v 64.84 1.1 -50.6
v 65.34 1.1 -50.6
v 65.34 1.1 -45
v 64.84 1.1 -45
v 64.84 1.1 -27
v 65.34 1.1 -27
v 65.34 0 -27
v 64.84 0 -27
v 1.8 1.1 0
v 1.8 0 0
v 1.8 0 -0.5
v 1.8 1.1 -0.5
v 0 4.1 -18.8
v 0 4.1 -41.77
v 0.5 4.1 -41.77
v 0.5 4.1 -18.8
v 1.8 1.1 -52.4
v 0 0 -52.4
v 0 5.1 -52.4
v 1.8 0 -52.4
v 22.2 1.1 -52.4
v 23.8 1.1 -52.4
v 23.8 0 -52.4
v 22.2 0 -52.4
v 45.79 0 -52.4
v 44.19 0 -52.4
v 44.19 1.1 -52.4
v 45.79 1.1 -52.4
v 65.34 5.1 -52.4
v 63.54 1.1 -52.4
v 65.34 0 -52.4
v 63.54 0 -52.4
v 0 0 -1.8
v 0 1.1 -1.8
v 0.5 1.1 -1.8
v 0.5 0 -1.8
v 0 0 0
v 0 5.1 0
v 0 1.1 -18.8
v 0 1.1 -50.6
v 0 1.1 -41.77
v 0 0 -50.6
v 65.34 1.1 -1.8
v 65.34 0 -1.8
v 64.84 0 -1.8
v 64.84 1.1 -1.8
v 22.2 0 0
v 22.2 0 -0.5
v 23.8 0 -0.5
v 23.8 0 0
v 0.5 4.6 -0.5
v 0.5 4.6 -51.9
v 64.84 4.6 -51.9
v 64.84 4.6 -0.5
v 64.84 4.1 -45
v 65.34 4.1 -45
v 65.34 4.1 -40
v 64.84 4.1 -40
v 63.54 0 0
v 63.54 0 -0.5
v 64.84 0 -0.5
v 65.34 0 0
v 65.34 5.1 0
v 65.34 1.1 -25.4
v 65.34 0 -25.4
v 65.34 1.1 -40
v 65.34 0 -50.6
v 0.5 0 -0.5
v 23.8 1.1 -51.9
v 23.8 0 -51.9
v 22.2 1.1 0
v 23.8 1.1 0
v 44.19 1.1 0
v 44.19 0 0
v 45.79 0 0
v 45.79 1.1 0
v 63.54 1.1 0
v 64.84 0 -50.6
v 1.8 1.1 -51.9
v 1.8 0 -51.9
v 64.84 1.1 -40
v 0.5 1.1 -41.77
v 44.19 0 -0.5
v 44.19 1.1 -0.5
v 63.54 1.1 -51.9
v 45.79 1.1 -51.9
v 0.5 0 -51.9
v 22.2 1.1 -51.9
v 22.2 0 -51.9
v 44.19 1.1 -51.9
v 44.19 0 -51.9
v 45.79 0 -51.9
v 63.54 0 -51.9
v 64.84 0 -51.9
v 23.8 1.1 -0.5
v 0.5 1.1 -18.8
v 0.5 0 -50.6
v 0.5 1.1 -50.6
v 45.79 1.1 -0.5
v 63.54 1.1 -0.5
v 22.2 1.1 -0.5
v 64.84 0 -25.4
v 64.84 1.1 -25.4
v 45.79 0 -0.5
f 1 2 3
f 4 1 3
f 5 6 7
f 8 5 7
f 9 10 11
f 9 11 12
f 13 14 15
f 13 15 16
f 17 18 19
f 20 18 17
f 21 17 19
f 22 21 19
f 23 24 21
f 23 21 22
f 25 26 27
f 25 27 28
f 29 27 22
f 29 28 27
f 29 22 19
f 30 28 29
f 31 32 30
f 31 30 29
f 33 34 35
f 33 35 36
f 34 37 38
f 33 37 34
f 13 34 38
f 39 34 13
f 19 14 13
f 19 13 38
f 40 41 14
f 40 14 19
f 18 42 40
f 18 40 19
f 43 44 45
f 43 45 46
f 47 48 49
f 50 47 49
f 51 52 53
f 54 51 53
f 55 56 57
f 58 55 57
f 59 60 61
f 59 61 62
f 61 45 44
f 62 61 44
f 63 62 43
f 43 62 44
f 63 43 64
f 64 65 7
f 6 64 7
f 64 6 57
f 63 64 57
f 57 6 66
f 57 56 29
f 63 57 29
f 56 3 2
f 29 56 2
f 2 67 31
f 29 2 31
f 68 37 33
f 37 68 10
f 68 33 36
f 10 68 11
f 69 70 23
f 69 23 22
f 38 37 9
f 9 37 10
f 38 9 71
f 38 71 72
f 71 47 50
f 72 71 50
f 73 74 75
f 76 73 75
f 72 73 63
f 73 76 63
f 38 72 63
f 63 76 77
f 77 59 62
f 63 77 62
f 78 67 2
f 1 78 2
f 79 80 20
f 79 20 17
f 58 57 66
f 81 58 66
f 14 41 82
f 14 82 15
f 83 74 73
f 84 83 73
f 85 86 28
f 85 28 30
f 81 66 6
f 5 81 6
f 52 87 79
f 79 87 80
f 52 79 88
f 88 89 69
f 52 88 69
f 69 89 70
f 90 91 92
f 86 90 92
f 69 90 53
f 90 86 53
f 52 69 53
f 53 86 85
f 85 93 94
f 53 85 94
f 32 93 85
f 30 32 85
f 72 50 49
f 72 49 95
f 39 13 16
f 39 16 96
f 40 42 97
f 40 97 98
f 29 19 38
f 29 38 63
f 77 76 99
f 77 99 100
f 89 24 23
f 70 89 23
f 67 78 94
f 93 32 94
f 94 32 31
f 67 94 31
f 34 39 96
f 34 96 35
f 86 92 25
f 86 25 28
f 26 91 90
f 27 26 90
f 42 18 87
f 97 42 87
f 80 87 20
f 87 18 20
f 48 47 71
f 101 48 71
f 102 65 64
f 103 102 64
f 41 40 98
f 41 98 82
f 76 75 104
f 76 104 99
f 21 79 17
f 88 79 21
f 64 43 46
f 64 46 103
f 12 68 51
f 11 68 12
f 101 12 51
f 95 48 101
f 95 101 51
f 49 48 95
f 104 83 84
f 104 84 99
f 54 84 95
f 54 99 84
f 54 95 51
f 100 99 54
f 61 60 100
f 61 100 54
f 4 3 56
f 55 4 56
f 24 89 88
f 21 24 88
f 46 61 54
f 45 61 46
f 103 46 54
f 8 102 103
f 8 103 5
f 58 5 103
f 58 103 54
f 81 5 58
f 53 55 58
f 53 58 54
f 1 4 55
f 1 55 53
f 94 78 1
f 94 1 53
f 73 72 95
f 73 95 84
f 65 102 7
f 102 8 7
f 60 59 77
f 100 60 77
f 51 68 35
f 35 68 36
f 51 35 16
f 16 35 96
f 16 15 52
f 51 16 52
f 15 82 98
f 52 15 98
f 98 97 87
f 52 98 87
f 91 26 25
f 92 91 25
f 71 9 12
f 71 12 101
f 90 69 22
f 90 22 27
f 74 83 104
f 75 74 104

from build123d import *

# Parameters (mm, degrees)
SKETCH_1_W          = 65.34
SKETCH_1_H          = 52.4
EXTRUDE_2_DEPTH     = 5.1
SKETCH_1_5_W        = 64.34
SKETCH_1_5_H        = 51.4
CUT_EXTRUDE_2_DEPTH = 4.6
SKETCH_2_W          = 20.4
SKETCH_2_H          = 1.1
SKETCH_2_W_2        = 20.39
SKETCH_2_W_3        = 17.75
CUT_EXTRUDE_3_DEPTH = 56.4
SKETCH_9_W          = 23.6
SKETCH_9_H          = 1.1
CUT_EXTRUDE_4_DEPTH = 4.9
CUT_EXTRUDE_6_DEPTH = 4.9


with BuildPart() as part:
    # 草图1 → 凸台-拉伸2 (new body)
    with BuildSketch(Plane(origin=(0, 0, 0), x_dir=(1, 0, 0), z_dir=(0, 1, 0))):
        with Locations((32.67, 26.2)):
            Rectangle(SKETCH_1_W, SKETCH_1_H)
    extrude(amount=EXTRUDE_2_DEPTH)

    # 草图1<5> → 切除-拉伸2 (cut)
    with BuildSketch(Plane(origin=(0, 0, 0), x_dir=(1, 0, 0), z_dir=(0, 1, 0))):
        with Locations((32.67, 26.2)):
            Rectangle(SKETCH_1_5_W, SKETCH_1_5_H)
    extrude(amount=CUT_EXTRUDE_2_DEPTH, mode=Mode.SUBTRACT)

    # 草图2 → 切除-拉伸3 (cut)
    with BuildSketch(Plane.XY):
        with Locations((12, 0.55)):
            Rectangle(SKETCH_2_W, SKETCH_2_H)
        with Locations((33.995, 0.55)):
            Rectangle(SKETCH_2_W_2, SKETCH_2_H)
        with Locations((54.665, 0.55)):
            Rectangle(SKETCH_2_W_3, SKETCH_2_H)
    extrude(amount=-CUT_EXTRUDE_3_DEPTH, mode=Mode.SUBTRACT)

    # 草图9 → 切除-拉伸4 (cut)
    with BuildSketch(Plane(origin=(65.34, 0, 0), x_dir=(0, 0, -1), z_dir=(1, 0, 0))):
        with Locations((13.6, 0.55)):
            Rectangle(SKETCH_9_W, SKETCH_9_H)
        Polygon((27, 0), (50.6, 0), (50.6, 1.1), (45, 1.1), (45, 4.1), (40, 4.1), (40, 1.1), (27, 1.1), align=None)
    extrude(amount=-CUT_EXTRUDE_4_DEPTH, mode=Mode.SUBTRACT)

    # 草图13 → 切除-拉伸6 (cut)
    with BuildSketch(Plane.ZY):
        Polygon((-50.6, 0), (-50.6, 1.1), (-41.77, 1.1), (-41.77, 4.1), (-18.8, 4.1), (-18.8, 1.1), (-1.8, 1.1), (-1.8, 0), align=None)
    extrude(amount=-CUT_EXTRUDE_6_DEPTH, mode=Mode.SUBTRACT)


solid = part.part
